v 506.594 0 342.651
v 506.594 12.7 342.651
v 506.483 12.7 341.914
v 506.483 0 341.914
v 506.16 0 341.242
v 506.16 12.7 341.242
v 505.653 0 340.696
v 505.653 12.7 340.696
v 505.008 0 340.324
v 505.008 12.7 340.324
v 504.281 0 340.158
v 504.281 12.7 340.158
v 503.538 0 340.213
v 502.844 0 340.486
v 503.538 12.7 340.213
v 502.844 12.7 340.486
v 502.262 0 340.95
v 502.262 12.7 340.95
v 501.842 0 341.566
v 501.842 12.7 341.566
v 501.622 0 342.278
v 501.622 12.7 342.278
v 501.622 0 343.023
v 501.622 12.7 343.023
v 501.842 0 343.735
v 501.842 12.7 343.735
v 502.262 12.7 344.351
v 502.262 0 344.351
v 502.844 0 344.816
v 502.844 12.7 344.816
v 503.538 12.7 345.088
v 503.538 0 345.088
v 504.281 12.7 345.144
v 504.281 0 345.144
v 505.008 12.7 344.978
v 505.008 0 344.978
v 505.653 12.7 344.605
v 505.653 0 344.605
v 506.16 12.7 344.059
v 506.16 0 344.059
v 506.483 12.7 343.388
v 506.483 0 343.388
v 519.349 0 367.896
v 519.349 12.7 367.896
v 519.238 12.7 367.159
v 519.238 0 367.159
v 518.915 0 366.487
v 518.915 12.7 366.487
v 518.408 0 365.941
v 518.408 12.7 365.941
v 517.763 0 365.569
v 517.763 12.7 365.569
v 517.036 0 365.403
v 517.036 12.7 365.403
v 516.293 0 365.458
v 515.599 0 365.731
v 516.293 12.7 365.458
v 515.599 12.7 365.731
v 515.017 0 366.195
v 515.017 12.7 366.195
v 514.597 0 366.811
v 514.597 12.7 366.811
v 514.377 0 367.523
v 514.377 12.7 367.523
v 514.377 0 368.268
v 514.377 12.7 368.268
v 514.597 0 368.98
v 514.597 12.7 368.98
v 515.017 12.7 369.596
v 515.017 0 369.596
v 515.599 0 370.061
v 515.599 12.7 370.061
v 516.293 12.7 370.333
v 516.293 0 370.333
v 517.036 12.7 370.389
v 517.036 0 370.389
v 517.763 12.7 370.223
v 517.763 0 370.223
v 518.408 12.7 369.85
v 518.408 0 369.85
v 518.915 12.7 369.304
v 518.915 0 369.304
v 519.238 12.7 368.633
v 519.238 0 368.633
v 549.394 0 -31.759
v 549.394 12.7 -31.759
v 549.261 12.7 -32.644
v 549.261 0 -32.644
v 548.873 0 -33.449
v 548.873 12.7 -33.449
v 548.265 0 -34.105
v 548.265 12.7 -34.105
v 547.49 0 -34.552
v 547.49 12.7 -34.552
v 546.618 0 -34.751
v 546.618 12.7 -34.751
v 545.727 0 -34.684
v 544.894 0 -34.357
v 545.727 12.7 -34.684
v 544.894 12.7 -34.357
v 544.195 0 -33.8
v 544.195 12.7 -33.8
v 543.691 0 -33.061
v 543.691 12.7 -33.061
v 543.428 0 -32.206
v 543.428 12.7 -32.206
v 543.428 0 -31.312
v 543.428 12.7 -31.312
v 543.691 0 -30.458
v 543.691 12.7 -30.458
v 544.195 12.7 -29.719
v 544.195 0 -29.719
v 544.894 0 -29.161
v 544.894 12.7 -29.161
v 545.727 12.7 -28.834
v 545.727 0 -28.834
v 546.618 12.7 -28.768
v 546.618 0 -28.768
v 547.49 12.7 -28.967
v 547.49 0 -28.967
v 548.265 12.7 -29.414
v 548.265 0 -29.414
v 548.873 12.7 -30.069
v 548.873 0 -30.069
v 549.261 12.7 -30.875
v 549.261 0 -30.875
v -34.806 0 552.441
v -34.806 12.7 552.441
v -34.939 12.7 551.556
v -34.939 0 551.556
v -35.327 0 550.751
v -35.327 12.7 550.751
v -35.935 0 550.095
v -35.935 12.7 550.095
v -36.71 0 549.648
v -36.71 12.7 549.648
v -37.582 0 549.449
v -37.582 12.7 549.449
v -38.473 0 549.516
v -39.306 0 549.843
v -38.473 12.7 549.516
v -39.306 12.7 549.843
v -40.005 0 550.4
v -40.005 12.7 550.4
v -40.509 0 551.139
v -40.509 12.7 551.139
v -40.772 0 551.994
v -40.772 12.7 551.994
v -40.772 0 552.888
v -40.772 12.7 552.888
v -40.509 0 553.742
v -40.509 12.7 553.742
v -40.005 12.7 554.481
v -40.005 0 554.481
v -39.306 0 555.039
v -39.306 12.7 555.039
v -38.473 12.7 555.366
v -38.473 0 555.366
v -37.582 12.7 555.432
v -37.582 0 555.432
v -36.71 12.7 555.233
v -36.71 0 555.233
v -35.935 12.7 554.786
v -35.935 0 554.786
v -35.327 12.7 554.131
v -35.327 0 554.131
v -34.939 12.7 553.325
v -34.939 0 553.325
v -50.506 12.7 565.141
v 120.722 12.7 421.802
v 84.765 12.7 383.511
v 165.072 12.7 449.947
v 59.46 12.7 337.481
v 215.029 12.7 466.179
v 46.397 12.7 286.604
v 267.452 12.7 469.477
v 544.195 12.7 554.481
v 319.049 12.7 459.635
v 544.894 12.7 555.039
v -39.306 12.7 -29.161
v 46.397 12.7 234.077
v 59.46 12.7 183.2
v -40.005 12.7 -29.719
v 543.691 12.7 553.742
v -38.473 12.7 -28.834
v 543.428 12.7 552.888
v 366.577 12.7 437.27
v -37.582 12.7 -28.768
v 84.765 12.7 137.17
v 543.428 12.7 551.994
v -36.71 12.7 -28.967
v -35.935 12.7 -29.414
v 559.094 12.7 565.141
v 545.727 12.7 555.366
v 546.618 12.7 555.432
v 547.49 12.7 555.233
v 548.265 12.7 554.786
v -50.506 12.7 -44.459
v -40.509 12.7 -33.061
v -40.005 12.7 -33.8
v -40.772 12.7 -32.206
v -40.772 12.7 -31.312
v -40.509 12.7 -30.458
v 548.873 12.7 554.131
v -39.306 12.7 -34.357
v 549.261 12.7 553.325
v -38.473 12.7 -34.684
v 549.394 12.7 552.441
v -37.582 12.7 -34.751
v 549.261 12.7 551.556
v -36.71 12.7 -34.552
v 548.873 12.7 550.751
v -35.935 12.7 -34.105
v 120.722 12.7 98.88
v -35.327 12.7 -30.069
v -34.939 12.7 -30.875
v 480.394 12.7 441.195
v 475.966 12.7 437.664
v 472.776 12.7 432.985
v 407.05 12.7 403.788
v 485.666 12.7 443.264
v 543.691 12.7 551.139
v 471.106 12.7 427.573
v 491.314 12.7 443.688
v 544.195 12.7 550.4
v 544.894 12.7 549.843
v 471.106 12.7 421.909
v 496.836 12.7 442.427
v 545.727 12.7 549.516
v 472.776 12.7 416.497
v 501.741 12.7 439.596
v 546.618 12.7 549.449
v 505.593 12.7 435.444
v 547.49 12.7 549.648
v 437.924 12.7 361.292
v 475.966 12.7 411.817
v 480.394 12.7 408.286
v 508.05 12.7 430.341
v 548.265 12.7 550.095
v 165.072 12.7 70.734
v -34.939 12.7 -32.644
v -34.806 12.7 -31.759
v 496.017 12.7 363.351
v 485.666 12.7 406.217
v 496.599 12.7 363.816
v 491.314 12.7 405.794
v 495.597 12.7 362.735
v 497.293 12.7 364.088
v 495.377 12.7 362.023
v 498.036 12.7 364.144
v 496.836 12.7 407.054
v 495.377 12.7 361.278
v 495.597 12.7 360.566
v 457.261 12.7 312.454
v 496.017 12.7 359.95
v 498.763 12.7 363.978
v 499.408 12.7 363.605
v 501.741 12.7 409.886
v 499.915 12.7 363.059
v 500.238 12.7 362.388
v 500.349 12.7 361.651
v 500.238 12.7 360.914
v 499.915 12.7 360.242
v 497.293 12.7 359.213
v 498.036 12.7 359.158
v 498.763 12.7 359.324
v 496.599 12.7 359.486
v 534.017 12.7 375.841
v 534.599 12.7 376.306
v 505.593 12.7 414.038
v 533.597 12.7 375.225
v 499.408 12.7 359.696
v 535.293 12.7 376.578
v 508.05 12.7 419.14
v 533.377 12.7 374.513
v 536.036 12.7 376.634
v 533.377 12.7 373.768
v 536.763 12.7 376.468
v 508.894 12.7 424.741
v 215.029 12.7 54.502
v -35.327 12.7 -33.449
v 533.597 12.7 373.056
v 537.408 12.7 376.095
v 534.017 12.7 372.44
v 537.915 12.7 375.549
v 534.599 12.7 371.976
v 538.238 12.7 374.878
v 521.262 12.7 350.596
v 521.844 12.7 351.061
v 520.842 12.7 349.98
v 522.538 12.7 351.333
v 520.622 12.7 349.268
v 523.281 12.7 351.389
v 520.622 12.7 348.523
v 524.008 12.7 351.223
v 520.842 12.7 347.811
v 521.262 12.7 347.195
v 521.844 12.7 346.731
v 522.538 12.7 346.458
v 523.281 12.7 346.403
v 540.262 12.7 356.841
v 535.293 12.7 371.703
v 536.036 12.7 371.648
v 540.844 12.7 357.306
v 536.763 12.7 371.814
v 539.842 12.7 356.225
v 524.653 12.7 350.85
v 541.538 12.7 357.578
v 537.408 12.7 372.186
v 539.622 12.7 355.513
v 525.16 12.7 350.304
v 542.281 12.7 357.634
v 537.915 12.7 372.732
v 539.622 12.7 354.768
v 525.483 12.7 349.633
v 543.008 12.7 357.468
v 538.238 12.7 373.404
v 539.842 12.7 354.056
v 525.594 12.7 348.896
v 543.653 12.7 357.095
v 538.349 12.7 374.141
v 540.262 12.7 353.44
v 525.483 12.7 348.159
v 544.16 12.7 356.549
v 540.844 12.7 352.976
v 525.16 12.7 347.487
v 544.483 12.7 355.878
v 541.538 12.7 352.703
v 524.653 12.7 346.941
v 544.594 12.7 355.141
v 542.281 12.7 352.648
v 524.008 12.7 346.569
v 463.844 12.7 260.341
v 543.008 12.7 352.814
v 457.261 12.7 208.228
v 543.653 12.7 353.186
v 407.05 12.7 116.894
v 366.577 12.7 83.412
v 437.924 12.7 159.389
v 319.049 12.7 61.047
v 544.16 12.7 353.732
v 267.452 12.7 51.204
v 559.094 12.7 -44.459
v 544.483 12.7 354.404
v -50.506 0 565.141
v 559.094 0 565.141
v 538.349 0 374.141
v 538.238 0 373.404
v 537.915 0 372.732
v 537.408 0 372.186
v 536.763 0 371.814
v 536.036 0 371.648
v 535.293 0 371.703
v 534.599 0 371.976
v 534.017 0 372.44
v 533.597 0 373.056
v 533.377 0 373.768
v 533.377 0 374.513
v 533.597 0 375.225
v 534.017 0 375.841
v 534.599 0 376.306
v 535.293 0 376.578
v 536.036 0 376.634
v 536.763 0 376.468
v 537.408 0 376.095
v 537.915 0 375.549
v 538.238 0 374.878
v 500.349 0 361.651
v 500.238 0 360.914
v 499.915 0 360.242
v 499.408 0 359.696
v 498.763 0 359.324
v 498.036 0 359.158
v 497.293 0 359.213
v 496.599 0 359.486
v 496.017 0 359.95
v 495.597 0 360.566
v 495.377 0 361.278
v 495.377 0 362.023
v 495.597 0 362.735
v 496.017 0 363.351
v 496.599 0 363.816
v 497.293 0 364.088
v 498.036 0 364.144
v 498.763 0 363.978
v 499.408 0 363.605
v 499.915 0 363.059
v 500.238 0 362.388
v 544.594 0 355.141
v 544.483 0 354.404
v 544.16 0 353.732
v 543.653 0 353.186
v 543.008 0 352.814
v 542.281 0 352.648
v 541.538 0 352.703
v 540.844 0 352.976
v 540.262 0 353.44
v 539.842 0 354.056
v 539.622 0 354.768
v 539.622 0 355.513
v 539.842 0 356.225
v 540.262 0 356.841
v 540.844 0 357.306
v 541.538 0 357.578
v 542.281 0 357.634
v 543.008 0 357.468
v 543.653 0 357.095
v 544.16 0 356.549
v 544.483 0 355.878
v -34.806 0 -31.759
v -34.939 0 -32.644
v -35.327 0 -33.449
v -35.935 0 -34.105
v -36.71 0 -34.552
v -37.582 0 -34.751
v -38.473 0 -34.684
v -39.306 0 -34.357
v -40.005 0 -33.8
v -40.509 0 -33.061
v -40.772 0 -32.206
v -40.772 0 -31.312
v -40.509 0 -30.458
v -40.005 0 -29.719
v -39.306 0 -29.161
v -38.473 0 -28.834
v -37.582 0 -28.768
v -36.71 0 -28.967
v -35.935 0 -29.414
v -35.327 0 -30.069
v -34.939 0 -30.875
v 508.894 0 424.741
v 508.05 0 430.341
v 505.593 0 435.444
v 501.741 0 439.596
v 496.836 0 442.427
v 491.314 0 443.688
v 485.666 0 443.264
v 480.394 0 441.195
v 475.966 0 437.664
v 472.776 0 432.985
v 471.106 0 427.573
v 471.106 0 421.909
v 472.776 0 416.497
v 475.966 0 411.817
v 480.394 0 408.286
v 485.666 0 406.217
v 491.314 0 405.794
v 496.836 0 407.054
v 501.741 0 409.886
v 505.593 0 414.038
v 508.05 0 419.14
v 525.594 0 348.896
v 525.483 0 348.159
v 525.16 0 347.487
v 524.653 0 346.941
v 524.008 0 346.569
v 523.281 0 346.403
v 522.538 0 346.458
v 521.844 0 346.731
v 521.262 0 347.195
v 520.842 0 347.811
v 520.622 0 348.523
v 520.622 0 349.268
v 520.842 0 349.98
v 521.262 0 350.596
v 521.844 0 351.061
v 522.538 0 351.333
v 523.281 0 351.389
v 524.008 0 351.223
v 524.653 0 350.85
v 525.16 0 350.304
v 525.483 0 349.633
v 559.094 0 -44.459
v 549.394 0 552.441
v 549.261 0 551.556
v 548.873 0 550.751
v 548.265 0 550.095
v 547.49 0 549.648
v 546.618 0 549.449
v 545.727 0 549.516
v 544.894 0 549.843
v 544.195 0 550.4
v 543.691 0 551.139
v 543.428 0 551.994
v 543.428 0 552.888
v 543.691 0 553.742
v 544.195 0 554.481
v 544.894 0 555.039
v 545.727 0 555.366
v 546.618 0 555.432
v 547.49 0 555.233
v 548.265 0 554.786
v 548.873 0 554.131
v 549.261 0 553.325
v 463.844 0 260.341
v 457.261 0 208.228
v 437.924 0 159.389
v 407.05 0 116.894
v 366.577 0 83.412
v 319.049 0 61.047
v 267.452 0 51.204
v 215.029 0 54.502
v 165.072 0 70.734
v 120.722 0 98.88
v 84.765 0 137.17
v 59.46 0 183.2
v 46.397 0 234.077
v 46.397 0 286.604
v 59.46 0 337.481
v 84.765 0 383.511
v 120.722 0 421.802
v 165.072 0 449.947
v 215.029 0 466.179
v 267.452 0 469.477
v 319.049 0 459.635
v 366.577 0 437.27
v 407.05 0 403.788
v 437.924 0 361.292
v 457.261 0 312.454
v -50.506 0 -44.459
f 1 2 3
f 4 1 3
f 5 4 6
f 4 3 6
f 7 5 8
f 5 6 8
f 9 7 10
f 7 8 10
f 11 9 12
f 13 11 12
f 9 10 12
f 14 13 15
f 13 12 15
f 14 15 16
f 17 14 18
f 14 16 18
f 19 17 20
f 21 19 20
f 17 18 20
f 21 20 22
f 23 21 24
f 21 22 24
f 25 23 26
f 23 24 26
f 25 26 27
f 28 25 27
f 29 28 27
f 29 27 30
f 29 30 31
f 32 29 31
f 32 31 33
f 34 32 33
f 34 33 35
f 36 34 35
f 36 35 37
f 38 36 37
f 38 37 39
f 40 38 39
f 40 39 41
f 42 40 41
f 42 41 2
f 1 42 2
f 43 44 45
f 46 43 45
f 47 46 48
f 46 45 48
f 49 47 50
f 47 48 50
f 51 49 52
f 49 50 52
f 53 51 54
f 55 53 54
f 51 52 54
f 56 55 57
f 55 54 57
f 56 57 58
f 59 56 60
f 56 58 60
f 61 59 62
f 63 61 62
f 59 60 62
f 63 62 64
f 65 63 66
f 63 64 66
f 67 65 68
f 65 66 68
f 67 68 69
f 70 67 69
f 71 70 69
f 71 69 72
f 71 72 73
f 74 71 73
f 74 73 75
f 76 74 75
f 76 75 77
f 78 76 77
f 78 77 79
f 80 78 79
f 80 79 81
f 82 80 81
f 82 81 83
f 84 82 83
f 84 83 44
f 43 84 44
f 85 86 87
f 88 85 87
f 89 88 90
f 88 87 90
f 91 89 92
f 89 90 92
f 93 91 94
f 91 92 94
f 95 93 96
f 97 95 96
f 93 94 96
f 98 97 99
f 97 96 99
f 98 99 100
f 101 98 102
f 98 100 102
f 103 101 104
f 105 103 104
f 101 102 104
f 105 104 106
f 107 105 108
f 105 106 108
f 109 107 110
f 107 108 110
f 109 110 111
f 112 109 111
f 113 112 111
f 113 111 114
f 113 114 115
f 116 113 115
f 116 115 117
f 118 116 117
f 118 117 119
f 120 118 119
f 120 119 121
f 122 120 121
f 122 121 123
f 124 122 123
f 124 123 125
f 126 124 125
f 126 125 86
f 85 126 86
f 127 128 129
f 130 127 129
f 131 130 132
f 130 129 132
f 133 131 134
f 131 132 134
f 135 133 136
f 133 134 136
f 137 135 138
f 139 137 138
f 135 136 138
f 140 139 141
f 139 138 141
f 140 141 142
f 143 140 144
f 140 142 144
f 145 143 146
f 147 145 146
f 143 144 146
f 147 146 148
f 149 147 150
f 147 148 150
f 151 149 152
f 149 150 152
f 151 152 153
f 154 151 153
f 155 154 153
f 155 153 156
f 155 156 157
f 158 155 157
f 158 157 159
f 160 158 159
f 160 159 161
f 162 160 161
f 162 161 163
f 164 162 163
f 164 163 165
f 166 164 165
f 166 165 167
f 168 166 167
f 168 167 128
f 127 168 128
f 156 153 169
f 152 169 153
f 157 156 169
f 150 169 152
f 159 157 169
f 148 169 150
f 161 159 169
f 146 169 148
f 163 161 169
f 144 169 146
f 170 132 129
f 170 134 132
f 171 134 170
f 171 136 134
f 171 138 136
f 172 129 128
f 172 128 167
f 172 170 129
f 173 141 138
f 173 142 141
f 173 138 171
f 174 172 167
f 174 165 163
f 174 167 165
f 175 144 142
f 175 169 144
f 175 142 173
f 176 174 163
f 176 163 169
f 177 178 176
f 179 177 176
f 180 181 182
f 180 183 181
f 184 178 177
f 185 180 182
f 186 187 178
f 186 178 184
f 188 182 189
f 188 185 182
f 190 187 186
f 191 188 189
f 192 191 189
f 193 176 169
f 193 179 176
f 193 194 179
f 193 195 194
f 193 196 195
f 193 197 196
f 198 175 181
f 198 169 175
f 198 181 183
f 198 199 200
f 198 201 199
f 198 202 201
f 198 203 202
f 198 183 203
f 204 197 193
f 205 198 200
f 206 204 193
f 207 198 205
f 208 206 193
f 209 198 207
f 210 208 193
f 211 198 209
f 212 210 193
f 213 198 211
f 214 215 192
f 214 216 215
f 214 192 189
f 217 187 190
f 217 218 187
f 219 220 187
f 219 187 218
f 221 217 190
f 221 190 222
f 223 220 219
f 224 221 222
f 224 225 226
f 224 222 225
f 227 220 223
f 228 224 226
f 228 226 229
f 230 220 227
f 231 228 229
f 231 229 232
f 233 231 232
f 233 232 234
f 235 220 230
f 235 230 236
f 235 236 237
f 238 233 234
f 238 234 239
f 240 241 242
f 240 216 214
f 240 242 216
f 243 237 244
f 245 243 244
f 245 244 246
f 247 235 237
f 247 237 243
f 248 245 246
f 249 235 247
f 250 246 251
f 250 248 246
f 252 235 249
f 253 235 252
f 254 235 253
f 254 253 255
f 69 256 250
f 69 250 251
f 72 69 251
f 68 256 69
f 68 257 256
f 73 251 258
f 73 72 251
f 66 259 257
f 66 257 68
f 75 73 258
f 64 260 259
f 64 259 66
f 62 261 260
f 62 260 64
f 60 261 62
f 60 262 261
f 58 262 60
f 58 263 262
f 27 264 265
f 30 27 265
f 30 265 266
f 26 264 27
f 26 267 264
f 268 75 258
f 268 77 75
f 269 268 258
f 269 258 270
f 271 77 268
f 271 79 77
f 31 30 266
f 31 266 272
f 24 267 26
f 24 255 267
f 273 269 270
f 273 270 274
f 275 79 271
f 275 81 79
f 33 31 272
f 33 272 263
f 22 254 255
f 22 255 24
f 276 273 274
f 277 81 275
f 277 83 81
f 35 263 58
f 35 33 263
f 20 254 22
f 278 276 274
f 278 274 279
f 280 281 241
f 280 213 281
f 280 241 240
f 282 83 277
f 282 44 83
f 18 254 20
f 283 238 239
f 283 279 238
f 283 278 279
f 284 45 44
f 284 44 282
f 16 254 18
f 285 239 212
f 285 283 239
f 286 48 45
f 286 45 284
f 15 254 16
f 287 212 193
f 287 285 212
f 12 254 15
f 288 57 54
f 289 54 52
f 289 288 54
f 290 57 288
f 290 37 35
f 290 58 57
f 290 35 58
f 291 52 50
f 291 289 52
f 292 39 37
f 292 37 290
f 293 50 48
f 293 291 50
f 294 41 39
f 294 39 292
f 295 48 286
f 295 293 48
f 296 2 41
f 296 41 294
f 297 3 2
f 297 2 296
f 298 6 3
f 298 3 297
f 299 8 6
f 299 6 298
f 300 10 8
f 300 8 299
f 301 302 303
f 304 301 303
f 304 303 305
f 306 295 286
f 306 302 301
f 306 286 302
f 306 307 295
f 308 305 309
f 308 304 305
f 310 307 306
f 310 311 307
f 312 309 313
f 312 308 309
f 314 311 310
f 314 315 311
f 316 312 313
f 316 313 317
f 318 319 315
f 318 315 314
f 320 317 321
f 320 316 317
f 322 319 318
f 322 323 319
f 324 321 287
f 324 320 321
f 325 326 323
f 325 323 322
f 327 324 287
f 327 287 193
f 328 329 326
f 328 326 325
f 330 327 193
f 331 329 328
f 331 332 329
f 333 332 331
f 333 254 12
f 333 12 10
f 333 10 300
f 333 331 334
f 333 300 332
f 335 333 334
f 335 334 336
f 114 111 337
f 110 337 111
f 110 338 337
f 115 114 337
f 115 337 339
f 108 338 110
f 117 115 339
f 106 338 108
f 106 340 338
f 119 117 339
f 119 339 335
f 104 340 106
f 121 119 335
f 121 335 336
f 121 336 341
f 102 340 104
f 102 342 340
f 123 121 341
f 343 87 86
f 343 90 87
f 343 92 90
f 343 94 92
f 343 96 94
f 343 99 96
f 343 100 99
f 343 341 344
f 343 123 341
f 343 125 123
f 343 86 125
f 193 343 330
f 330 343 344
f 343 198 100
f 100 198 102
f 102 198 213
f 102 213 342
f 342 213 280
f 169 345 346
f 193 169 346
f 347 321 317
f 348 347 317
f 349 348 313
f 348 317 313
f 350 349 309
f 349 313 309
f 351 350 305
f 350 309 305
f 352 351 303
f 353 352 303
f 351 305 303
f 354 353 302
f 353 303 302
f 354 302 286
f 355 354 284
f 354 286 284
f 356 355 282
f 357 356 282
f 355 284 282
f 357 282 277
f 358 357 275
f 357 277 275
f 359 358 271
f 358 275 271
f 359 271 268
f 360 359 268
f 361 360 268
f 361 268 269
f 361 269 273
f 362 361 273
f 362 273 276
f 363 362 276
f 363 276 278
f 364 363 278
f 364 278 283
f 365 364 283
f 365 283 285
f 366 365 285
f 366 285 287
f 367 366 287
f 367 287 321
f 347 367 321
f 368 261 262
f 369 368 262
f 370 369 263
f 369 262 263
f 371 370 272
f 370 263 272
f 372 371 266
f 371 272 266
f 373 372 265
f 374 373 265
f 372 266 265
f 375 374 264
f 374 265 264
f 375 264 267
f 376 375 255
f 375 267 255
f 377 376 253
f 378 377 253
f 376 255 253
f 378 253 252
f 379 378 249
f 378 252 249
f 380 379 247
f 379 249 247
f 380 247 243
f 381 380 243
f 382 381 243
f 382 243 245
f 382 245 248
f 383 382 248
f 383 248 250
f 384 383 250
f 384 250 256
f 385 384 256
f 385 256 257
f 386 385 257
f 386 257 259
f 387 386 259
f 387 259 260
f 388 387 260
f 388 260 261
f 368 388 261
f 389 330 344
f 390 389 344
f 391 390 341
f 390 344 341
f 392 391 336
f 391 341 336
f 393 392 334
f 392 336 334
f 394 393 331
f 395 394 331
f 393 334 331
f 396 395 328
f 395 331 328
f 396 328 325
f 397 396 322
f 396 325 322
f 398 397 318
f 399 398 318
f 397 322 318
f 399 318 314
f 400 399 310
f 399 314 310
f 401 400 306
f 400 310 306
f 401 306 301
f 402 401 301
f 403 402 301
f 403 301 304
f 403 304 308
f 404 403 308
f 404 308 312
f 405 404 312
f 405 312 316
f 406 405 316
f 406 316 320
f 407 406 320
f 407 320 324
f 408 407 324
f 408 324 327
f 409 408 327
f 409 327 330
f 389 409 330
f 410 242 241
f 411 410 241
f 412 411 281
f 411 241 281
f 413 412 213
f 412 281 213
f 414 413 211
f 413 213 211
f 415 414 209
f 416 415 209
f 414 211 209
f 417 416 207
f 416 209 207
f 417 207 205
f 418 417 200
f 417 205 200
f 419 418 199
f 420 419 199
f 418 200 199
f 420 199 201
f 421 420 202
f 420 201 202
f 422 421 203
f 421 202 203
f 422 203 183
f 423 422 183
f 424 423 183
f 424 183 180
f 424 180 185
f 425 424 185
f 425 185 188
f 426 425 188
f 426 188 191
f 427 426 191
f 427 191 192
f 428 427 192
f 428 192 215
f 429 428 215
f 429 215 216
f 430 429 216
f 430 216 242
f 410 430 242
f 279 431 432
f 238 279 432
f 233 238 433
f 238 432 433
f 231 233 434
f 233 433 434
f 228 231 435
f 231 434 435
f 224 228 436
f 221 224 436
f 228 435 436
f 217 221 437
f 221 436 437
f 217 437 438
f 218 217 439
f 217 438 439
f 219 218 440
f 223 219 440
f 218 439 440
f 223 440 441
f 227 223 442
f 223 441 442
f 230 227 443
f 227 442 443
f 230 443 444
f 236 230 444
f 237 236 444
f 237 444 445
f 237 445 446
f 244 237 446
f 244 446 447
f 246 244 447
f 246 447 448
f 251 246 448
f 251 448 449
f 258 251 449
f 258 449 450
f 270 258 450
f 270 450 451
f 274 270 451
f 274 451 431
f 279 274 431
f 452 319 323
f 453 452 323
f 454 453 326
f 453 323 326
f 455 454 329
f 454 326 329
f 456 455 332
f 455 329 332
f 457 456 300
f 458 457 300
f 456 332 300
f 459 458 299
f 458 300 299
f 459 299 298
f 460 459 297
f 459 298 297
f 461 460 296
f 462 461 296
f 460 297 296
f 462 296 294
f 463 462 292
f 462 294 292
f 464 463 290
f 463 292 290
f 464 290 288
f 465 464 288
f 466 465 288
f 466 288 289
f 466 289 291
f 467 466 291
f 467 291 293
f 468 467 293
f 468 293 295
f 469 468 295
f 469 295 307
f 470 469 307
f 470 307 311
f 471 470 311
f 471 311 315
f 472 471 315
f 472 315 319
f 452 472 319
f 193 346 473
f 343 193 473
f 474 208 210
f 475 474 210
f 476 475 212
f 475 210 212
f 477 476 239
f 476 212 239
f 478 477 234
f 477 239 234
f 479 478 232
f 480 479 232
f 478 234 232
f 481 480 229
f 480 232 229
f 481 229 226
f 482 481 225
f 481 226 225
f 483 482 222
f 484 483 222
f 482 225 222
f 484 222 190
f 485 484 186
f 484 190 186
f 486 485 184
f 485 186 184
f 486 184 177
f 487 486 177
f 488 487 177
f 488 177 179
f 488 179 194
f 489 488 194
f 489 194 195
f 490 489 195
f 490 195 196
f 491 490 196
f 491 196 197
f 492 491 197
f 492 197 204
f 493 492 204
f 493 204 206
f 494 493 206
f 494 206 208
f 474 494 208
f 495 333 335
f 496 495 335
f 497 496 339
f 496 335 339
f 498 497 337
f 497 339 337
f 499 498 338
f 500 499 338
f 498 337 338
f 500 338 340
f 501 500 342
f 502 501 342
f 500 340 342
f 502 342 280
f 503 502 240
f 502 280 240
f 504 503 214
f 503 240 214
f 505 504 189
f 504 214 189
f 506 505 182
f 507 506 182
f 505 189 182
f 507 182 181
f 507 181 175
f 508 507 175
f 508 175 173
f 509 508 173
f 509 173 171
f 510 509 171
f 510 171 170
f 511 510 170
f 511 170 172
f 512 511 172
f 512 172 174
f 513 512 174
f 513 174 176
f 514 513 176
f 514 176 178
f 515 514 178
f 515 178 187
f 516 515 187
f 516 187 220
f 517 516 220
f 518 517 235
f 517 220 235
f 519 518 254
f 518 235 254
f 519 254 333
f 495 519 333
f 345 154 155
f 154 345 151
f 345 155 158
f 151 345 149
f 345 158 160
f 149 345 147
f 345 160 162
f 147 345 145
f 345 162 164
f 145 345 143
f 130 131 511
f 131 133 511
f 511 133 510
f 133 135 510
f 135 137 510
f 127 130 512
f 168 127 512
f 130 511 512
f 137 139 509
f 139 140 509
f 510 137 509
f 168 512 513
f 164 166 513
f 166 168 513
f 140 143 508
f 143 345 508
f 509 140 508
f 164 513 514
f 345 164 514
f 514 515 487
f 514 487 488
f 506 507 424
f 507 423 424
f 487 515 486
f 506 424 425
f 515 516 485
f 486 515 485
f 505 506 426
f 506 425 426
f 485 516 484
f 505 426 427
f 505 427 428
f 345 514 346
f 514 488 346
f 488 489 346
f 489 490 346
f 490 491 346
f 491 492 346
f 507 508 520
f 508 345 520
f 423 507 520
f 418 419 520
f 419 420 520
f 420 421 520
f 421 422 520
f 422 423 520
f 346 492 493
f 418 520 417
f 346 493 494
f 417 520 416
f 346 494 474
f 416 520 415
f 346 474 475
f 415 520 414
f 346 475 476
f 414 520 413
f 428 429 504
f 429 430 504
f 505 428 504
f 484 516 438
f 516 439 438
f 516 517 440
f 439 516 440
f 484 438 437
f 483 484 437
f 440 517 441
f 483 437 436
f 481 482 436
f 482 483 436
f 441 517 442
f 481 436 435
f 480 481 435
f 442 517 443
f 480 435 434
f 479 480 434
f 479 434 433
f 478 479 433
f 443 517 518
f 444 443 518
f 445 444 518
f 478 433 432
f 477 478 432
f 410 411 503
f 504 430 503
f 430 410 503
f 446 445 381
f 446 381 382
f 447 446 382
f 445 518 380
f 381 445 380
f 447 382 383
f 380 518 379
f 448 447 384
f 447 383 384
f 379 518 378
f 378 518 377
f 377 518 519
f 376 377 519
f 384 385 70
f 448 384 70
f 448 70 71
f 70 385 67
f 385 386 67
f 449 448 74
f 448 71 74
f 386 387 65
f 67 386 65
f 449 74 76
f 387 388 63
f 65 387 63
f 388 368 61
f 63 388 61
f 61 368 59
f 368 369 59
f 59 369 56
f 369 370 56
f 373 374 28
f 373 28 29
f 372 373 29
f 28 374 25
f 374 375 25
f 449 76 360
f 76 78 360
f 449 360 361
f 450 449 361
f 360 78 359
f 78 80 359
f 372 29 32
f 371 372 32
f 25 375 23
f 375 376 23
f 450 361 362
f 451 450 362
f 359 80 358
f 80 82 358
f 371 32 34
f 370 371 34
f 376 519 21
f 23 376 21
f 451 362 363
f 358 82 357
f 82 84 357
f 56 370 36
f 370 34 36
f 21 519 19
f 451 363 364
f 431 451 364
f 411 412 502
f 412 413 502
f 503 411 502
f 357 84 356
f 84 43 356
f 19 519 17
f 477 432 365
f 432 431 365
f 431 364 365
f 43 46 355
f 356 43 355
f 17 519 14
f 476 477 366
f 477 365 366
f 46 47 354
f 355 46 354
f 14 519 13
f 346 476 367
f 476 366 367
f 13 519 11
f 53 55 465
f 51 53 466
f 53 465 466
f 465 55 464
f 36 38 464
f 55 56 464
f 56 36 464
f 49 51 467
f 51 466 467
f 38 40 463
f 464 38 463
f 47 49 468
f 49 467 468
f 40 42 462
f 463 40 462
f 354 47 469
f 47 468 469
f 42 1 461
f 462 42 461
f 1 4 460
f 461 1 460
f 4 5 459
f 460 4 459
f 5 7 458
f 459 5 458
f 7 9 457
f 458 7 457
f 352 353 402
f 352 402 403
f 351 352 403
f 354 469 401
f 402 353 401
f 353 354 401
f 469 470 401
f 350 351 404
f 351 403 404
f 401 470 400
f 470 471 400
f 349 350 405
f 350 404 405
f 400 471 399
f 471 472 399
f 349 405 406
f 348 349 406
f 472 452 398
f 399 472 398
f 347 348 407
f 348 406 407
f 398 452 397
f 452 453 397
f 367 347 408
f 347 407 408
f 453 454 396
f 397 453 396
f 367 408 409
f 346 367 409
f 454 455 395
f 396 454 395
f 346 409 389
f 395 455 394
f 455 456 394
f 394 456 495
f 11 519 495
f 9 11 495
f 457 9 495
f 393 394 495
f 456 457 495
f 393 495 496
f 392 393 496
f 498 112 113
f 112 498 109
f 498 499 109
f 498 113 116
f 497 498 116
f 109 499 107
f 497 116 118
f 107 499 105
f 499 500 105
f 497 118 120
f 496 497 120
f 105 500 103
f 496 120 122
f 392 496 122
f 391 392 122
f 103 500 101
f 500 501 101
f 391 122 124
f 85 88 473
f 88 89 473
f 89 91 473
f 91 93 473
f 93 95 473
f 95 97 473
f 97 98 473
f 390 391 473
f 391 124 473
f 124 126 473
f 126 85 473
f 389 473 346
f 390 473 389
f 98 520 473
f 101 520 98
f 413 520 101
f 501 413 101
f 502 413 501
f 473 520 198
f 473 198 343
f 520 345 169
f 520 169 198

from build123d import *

# Parameters (mm, degrees)
SKETCH1_W           = 609.6
SKETCH1_H           = 609.6
BOSS_EXTRUDE1_DEPTH = 12.7
SKETCH2_R           = 209.55
CUT_EXTRUDE1_DEPTH  = 13.7
SKETCH3_R           = 19
CUT_EXTRUDE2_DEPTH  = 13.7
SKETCH4_R           = 2.5
CUT_EXTRUDE3_DEPTH  = 13.7
SKETCH5_R           = 3
CUT_EXTRUDE4_DEPTH  = 13.7


with BuildPart() as part:
    # Sketch1 → Boss-Extrude1 (new body)
    with BuildSketch(Plane(origin=(0, 0, 0), x_dir=(1, 0, 0), z_dir=(0, 1, 0))):
        with Locations((254.294265396, -260.340726581)):
            Rectangle(SKETCH1_W, SKETCH1_H)
    extrude(amount=BOSS_EXTRUDE1_DEPTH)

    # Sketch2 → Cut-Extrude1 (cut, through all)
    with BuildSketch(Plane(origin=(0, 12.7, 0), x_dir=(1, 0, 0), z_dir=(0, 1, 0))):
        with Locations((254.294265396, -260.340726581)):
            Circle(SKETCH2_R)
    extrude(amount=-CUT_EXTRUDE1_DEPTH, mode=Mode.SUBTRACT)

    # Sketch3 → Cut-Extrude2 (cut, through all)
    with BuildSketch(Plane.XZ):
        with Locations((489.894265396, 424.740726581)):
            Circle(SKETCH3_R)
    extrude(amount=-CUT_EXTRUDE2_DEPTH, mode=Mode.SUBTRACT)

    # Sketch4 → Cut-Extrude3 (cut, through all)
    with BuildSketch(Plane(origin=(0, 12.7, 0), x_dir=(1, 0, 0), z_dir=(0, 1, 0))):
        with Locations((542.094265396, -355.140726581)):
            Circle(SKETCH4_R)
        with Locations((523.094265396, -348.895728582)):
            Circle(SKETCH4_R)
        with Locations((504.094265396, -342.650730584)):
            Circle(SKETCH4_R)
        with Locations((497.849267397, -361.650730584)):
            Circle(SKETCH4_R)
        with Locations((516.849267397, -367.895728582)):
            Circle(SKETCH4_R)
        with Locations((535.849267397, -374.140726581)):
            Circle(SKETCH4_R)
    extrude(amount=-CUT_EXTRUDE3_DEPTH, mode=Mode.SUBTRACT)

    # Sketch5 → Cut-Extrude4 (cut, through all)
    with BuildSketch(Plane(origin=(0, 12.7, 0), x_dir=(1, 0, 0), z_dir=(0, 1, 0))):
        with Locations((546.394265396, -552.440726581)):
            Circle(SKETCH5_R)
        with Locations((-37.805734604, -552.440726581)):
            Circle(SKETCH5_R)
        with Locations((-37.805734604, 31.759273419)):
            Circle(SKETCH5_R)
        with Locations((546.394265396, 31.759273419)):
            Circle(SKETCH5_R)
    extrude(amount=-CUT_EXTRUDE4_DEPTH, mode=Mode.SUBTRACT)


solid = part.part
